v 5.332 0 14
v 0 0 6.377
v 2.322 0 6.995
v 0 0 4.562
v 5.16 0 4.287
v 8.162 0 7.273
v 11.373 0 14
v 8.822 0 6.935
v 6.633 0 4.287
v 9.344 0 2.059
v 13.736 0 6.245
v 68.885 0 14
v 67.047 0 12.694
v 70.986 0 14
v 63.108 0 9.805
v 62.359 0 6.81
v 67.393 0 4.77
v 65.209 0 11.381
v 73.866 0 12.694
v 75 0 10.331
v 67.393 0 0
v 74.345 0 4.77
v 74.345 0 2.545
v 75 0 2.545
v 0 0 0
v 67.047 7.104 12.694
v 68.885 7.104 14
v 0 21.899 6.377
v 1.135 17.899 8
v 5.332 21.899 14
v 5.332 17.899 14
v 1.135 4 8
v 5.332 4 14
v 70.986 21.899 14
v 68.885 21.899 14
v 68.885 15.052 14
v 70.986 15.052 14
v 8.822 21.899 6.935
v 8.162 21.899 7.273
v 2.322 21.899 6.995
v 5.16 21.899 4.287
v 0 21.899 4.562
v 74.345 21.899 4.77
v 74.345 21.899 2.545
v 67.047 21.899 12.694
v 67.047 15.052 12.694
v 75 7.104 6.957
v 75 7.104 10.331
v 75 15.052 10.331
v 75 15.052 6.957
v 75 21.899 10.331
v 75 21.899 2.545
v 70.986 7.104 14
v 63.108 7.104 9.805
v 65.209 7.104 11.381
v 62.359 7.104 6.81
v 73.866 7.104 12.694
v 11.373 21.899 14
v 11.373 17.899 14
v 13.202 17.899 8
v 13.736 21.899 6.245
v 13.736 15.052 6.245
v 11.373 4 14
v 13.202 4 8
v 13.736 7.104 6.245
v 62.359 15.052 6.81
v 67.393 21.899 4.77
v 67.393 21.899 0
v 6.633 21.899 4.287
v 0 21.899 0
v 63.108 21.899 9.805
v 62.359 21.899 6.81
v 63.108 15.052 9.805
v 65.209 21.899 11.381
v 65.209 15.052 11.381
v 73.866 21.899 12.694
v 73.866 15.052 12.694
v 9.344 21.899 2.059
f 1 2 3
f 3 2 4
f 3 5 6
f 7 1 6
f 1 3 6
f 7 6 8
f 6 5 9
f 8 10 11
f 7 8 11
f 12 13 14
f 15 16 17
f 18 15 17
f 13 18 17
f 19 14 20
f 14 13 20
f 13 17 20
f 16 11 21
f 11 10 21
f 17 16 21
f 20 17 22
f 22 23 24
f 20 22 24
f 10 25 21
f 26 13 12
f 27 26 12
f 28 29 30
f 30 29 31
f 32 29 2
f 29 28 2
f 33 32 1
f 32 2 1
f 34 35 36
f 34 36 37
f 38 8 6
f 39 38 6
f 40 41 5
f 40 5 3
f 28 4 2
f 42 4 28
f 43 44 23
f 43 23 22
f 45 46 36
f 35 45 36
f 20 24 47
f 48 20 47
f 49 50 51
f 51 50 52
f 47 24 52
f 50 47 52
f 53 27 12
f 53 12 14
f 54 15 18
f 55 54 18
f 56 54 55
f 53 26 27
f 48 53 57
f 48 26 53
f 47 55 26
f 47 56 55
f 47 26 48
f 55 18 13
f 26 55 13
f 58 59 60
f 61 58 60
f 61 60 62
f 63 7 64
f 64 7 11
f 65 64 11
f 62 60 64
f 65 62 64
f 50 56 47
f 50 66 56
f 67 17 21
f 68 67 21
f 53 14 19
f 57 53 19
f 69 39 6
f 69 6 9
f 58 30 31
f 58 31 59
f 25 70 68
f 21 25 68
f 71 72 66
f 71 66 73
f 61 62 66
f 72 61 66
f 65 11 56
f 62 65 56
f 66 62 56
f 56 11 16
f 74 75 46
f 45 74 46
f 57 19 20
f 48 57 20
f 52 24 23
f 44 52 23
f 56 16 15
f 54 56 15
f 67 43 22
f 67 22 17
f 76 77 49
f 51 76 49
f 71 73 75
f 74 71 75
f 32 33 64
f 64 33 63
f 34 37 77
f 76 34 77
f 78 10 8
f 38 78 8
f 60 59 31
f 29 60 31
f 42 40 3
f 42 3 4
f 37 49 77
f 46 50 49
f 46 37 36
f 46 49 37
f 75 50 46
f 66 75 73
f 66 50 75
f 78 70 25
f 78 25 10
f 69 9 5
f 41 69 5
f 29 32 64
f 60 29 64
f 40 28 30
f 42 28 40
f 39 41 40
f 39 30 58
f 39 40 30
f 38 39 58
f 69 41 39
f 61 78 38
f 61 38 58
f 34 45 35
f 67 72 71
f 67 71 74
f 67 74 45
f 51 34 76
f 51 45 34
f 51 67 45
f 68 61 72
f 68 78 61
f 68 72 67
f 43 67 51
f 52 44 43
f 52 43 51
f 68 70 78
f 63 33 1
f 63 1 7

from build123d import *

# Parameters (mm, degrees)
F0_W     = 75
F0_H     = 21.8987613916
F1_DEPTH = 14
F3_DEPTH = 21.8997613916
F4_W     = 23.978275167
F4_H     = 7.947247941
F4_W_2   = 48.6262406095
F5_DEPTH = 25
F6_W     = 7.6308213174
F6_H     = 13.8987613916
F6_W_2   = 6.0403123498
F6_W_3   = 10.3618325666
F7_DEPTH = 6


with BuildPart() as f1:
    # F0 (on Top) → F1 (new body)
    with BuildSketch(Plane.XY):
        with Locations((37.5, 10.9493806958)):
            Rectangle(F0_W, F0_H)
    extrude(amount=F1_DEPTH)

    # F2 (on face) → F3 (cut, through all)
    with BuildSketch(Plane.XZ):
        Polygon((0, 14), (0, 6.3767037354), (5.3324829787, 14), align=None)
        Polygon((68.8854381442, 14), (11.3727953285, 14), (13.736397028, 6.2453923747), (62.3593553901, 6.8103666529), (63.1077513099, 9.8052984104), (65.2087256312, 11.3810319453), (67.0470818877, 12.6941427588), align=None)
        Polygon((75, 14), (70.9864199162, 14), (73.8660361752, 12.6941427588), (75, 10.330542922), align=None)
        Polygon((67.3934295774, 4.770135507), (67.3934295774, 0), (75, 0), (75, 2.5454831775), (74.345, 2.5454831775), (74.345, 4.770135507), align=None)
        Polygon((2.3223445751, 6.9947880693), (0, 4.561574664), (0, 0), (9.3439053744, 2.0588401239), (8.8216059457, 6.9350752235), (8.1620588899, 7.2728698142), (6.6326097585, 4.2866062695), (5.1598150908, 4.2866062695), align=None)
    extrude(amount=-F3_DEPTH, mode=Mode.SUBTRACT)

    # F4 (on face) → F5 (cut)
    with BuildSketch(Plane(origin=(-0.0707041789, 0, 6.0849608152), x_dir=(0.9999325005, 0, 0.0116187119), z_dir=(-0.0116187119, 0, 0.9999325005))):
        with Locations((74.4234114354, 11.0779821407)):
            Rectangle(F4_W, F4_H)
        with Locations((38.1211535471, 11.0779821407)):
            Rectangle(F4_W_2, F4_H)
    extrude(amount=F5_DEPTH, mode=Mode.SUBTRACT)

    # F6 (on face) → F7 (cut)
    with BuildSketch(Plane.XY.offset(14)):
        with Locations((15.1882059872, 10.9493806958)):
            Rectangle(F6_W, F6_H)
        with Locations((8.3526391536, 10.9493806958)):
            Rectangle(F6_W_2, F6_H)
        with Locations((0.1515666954, 10.9493806958)):
            Rectangle(F6_W_3, F6_H)
    extrude(amount=-F7_DEPTH, mode=Mode.SUBTRACT)


solid = f1.part
